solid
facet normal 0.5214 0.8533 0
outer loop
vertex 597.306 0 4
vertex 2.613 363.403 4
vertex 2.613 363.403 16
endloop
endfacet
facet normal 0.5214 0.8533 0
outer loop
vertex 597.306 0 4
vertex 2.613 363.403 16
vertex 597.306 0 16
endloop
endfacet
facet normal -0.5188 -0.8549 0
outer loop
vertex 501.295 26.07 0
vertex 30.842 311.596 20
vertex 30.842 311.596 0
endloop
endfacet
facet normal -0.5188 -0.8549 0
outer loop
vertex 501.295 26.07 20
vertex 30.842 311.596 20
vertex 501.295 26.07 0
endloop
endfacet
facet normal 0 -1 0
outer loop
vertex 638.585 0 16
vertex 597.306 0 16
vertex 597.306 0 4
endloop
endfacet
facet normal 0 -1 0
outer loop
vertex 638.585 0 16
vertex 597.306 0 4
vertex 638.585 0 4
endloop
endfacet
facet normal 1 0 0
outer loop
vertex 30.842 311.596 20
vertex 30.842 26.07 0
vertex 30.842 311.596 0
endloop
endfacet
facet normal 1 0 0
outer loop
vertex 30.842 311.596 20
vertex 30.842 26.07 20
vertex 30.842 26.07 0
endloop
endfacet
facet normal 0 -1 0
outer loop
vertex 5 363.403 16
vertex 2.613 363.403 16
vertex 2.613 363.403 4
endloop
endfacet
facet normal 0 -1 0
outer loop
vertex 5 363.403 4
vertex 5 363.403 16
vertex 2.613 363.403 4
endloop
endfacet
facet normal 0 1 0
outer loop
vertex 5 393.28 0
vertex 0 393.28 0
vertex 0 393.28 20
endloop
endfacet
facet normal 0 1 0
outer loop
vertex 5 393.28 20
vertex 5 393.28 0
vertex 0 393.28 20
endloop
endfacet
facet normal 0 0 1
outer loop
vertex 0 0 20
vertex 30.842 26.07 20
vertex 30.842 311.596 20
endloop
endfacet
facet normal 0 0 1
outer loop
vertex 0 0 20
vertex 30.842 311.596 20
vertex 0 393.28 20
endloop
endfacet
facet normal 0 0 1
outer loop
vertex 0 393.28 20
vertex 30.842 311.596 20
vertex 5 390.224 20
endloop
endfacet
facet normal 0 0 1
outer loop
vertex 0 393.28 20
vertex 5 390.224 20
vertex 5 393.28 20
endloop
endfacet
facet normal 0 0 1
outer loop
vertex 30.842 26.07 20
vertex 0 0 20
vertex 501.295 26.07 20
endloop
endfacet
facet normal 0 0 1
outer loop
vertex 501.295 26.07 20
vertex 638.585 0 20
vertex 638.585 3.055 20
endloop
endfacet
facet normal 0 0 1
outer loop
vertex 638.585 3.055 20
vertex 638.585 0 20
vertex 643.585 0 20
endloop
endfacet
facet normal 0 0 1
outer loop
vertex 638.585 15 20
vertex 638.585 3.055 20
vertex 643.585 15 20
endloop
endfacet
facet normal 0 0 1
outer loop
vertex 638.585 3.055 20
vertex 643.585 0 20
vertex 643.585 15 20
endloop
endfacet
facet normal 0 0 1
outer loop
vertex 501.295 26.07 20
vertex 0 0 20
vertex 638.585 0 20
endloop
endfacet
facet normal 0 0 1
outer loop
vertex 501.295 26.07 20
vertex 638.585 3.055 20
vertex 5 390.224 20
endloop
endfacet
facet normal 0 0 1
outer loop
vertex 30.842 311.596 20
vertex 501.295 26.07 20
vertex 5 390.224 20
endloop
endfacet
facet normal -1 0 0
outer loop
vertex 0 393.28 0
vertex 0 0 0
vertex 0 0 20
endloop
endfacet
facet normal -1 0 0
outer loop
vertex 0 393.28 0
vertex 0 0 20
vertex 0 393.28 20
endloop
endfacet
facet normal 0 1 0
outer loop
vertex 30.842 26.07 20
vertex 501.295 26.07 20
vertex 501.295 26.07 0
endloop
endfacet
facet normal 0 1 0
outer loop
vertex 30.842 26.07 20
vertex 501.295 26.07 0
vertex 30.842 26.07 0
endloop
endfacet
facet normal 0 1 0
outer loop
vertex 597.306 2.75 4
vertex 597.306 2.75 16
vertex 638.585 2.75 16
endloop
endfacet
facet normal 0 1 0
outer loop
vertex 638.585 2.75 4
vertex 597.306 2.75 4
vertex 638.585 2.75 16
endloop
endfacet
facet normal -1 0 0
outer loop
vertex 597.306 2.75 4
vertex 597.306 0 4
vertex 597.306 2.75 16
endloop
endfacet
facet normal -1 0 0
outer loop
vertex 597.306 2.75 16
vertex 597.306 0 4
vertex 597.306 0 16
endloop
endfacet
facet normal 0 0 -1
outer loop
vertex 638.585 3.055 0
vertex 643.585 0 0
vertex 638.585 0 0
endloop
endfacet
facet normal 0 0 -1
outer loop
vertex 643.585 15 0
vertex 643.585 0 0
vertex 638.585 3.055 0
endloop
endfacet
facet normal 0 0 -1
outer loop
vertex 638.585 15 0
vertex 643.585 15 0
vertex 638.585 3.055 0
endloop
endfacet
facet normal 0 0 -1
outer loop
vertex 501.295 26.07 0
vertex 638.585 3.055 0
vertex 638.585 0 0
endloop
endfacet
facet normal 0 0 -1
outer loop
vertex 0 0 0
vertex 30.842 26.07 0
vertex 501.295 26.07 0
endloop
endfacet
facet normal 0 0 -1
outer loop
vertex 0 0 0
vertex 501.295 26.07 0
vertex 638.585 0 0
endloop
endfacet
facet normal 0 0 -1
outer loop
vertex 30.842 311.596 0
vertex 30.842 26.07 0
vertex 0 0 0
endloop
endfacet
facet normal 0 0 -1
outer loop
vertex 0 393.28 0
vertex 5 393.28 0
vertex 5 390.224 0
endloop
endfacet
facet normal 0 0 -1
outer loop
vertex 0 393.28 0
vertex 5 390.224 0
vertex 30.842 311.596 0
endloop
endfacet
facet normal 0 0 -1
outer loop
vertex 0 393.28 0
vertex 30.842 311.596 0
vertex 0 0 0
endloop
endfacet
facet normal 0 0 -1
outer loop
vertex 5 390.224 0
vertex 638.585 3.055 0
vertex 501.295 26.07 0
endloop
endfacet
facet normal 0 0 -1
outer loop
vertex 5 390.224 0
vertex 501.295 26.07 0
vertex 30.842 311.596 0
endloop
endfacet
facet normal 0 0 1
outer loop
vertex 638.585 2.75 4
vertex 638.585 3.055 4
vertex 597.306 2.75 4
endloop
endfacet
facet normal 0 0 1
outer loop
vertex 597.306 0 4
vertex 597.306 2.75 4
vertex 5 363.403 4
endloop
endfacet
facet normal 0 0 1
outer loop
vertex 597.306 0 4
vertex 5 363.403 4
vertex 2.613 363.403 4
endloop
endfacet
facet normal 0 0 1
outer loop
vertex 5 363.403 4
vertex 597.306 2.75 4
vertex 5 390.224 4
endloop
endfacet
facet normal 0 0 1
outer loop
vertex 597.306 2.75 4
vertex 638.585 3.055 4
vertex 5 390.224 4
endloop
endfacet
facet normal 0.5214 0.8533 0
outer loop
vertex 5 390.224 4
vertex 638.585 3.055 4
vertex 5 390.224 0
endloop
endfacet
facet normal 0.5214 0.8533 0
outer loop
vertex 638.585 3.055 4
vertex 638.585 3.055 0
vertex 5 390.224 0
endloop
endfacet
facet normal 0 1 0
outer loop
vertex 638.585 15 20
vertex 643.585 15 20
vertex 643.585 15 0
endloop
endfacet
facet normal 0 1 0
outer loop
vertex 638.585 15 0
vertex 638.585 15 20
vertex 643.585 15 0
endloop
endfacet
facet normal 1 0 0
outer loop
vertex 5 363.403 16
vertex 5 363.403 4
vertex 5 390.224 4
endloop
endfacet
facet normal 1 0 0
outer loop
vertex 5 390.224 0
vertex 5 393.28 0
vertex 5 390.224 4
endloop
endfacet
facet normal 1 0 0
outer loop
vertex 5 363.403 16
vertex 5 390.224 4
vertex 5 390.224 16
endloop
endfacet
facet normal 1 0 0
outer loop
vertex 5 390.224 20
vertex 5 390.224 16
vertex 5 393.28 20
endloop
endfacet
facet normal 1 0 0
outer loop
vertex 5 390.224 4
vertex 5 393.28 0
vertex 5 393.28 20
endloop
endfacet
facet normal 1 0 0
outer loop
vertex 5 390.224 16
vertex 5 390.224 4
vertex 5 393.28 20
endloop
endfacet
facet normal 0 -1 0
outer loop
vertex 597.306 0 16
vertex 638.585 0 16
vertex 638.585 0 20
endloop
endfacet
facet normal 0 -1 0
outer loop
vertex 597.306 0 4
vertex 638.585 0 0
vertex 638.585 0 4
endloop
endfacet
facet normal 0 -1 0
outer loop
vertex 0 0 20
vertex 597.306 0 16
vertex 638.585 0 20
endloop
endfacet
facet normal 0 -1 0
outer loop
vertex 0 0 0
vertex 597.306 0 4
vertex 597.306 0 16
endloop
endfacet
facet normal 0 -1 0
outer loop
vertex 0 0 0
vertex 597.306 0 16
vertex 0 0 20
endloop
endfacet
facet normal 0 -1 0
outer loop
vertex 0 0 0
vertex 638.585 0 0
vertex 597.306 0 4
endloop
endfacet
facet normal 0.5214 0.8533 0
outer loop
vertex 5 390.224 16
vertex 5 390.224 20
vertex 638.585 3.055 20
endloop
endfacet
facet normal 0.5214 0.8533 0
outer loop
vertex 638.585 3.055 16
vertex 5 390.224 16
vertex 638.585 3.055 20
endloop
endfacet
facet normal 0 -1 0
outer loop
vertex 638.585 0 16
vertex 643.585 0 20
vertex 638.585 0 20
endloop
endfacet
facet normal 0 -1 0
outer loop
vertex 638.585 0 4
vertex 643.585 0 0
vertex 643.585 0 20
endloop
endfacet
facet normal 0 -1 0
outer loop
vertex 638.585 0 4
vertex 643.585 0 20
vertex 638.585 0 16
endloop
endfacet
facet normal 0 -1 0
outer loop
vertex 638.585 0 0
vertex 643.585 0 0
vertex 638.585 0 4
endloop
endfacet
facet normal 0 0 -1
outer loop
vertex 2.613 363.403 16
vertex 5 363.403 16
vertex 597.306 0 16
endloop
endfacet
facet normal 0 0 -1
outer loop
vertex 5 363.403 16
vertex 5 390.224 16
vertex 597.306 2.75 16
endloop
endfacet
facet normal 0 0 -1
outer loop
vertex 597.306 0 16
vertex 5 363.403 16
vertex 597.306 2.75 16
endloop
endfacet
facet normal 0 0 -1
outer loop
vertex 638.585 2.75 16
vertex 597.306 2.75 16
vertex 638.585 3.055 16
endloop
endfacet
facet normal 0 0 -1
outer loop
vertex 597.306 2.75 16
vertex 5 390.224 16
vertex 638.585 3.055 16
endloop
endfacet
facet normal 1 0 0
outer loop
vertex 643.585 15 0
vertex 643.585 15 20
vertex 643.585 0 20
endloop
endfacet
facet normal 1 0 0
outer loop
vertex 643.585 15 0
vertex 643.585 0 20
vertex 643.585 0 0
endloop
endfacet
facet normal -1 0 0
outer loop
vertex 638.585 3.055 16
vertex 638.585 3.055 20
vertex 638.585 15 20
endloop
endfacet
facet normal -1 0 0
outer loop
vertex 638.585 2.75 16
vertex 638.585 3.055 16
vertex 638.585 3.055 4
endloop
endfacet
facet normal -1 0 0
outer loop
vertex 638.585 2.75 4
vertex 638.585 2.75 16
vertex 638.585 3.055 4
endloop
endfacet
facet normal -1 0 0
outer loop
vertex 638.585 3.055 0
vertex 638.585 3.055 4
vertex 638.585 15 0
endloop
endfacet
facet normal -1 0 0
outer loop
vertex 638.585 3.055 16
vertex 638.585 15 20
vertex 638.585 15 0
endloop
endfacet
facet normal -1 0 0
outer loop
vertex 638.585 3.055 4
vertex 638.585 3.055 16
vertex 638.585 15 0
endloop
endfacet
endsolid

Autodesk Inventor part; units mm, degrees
ref_plane "YZ Plane" through (0, 0, 0) normal (1, 0, 0) x (0, 1, 0)
ref_plane "XZ Plane" through (0, 0, 0) normal (0, 1, 0) x (-1, 0, 0)
ref_plane "XY Plane" through (0, 0, 0) normal (0, 0, 1) x (1, 0, 0)
sketch "Sketch1" plane through (0, 0, 0) normal (0, 0, 1) x (1, 0, 0)
  line L0 (0, 0) -> (0, 365)
  line L1 (0, 365) -> (597.3065, 0)
  line L2 (597.3065, 0) -> (0, 0)
  dimension "d0" = 365
  dimension "d1" = 700
extrude "Extrusion1" add sketch "Sketch1" along normal blind 20
sketch "Sketch2" plane through (0, 0, 20) normal (0, 0, 1) x (1, 0, 0)
  line L0 (30.8422, 26.0696) -> (30.8422, 311.5961)
  line L1 (0, 365) -> (0, 0) projected
  line L2 (30.8422, 311.5961) -> (501.2951, 26.0696)
  line L3 (501.2951, 26.0696) -> (30.8422, 26.0696)
extrude "Extrusion2" cut sketch "Sketch2" against normal blind 161.75
sketch "Sketch3" plane through (0, 0, 20) normal (0, 0, 1) x (1, 0, 0)
  line L0 (0, 365) -> (597.3065, 0) projected
  line L1 (0, 365) -> (0, 393.2795)
  line L2 (0, 393.2795) -> (643.5846, 0)
  line L3 (597.3065, 0) -> (643.5846, 0)
  point P0 (0, 0)
extrude "Extrusion3" add sketch "Sketch3" against normal blind 4
sketch "Sketch4" plane through (0, 0, 0) normal (0, 0, -1) x (-1, 0, 0)
  line L0 (-597.3065, 0) -> (0, 0) projected
  line L1 (-643.5846, 0) -> (-597.3065, 0) projected
  line L2 (-597.3065, 0) -> (-643.5846, 0)
  line L3 (0, 365) -> (0, 393.2795) projected
  line L4 (-643.5846, 0) -> (0, 393.2795)
  line L5 (0, 393.2795) -> (0, 365)
  line L6 (0, 365) -> (-597.3065, 0)
extrude "Extrusion4" add sketch "Sketch4" against normal blind 4
sketch "Sketch5" plane through (0, 0, 0) normal (0, -1, 0) x (1, 0, 0)
  line L0 (597.3065, 4) -> (643.5846, 4) projected
  line L1 (643.5846, 20) -> (643.5846, 16) projected
  line L2 (643.5846, 4) -> (643.5846, 16)
  line L3 (597.3065, 4) -> (597.3065, 16) projected
  line L4 (643.5846, 16) -> (597.3065, 16)
  line L5 (597.3065, 16) -> (597.3065, 4)
  point P0 (0, 0)
extrude "Extrusion5" add sketch "Sketch5" against normal blind 2.75
sketch "Sketch6" plane through (643.5846, 0, 16) normal (1, 0, 0) x (0, 0, -1)
  line L0 (-4, 0) -> (-4, 393.2795) projected
  line L1 (16, 0) -> (-4, 0)
  line L2 (-4, 0) -> (-4, 15)
  line L3 (-4, 15) -> (16, 15)
  line L4 (16, 15) -> (16, 0)
  dimension "d12" = 15
extrude "Extrusion6" add sketch "Sketch6" against normal blind 5
sketch "Sketch7" plane through (0, 0, 0) normal (-1, 0, 0) x (0, 0, 1)
  line L0 (0, 0) -> (0, 393.2795) projected
  line L1 (20, 3.0554) -> (20, 393.2795) projected
  line L2 (0, 393.2795) -> (20, 393.2795)
  line L3 (20, 393.2795) -> (20, 363.4031)
  line L4 (20, 363.4031) -> (0, 363.4031)
  line L5 (0, 363.4031) -> (0, 393.2795)
extrude "Extrusion7" add sketch "Sketch7" against normal blind 5
